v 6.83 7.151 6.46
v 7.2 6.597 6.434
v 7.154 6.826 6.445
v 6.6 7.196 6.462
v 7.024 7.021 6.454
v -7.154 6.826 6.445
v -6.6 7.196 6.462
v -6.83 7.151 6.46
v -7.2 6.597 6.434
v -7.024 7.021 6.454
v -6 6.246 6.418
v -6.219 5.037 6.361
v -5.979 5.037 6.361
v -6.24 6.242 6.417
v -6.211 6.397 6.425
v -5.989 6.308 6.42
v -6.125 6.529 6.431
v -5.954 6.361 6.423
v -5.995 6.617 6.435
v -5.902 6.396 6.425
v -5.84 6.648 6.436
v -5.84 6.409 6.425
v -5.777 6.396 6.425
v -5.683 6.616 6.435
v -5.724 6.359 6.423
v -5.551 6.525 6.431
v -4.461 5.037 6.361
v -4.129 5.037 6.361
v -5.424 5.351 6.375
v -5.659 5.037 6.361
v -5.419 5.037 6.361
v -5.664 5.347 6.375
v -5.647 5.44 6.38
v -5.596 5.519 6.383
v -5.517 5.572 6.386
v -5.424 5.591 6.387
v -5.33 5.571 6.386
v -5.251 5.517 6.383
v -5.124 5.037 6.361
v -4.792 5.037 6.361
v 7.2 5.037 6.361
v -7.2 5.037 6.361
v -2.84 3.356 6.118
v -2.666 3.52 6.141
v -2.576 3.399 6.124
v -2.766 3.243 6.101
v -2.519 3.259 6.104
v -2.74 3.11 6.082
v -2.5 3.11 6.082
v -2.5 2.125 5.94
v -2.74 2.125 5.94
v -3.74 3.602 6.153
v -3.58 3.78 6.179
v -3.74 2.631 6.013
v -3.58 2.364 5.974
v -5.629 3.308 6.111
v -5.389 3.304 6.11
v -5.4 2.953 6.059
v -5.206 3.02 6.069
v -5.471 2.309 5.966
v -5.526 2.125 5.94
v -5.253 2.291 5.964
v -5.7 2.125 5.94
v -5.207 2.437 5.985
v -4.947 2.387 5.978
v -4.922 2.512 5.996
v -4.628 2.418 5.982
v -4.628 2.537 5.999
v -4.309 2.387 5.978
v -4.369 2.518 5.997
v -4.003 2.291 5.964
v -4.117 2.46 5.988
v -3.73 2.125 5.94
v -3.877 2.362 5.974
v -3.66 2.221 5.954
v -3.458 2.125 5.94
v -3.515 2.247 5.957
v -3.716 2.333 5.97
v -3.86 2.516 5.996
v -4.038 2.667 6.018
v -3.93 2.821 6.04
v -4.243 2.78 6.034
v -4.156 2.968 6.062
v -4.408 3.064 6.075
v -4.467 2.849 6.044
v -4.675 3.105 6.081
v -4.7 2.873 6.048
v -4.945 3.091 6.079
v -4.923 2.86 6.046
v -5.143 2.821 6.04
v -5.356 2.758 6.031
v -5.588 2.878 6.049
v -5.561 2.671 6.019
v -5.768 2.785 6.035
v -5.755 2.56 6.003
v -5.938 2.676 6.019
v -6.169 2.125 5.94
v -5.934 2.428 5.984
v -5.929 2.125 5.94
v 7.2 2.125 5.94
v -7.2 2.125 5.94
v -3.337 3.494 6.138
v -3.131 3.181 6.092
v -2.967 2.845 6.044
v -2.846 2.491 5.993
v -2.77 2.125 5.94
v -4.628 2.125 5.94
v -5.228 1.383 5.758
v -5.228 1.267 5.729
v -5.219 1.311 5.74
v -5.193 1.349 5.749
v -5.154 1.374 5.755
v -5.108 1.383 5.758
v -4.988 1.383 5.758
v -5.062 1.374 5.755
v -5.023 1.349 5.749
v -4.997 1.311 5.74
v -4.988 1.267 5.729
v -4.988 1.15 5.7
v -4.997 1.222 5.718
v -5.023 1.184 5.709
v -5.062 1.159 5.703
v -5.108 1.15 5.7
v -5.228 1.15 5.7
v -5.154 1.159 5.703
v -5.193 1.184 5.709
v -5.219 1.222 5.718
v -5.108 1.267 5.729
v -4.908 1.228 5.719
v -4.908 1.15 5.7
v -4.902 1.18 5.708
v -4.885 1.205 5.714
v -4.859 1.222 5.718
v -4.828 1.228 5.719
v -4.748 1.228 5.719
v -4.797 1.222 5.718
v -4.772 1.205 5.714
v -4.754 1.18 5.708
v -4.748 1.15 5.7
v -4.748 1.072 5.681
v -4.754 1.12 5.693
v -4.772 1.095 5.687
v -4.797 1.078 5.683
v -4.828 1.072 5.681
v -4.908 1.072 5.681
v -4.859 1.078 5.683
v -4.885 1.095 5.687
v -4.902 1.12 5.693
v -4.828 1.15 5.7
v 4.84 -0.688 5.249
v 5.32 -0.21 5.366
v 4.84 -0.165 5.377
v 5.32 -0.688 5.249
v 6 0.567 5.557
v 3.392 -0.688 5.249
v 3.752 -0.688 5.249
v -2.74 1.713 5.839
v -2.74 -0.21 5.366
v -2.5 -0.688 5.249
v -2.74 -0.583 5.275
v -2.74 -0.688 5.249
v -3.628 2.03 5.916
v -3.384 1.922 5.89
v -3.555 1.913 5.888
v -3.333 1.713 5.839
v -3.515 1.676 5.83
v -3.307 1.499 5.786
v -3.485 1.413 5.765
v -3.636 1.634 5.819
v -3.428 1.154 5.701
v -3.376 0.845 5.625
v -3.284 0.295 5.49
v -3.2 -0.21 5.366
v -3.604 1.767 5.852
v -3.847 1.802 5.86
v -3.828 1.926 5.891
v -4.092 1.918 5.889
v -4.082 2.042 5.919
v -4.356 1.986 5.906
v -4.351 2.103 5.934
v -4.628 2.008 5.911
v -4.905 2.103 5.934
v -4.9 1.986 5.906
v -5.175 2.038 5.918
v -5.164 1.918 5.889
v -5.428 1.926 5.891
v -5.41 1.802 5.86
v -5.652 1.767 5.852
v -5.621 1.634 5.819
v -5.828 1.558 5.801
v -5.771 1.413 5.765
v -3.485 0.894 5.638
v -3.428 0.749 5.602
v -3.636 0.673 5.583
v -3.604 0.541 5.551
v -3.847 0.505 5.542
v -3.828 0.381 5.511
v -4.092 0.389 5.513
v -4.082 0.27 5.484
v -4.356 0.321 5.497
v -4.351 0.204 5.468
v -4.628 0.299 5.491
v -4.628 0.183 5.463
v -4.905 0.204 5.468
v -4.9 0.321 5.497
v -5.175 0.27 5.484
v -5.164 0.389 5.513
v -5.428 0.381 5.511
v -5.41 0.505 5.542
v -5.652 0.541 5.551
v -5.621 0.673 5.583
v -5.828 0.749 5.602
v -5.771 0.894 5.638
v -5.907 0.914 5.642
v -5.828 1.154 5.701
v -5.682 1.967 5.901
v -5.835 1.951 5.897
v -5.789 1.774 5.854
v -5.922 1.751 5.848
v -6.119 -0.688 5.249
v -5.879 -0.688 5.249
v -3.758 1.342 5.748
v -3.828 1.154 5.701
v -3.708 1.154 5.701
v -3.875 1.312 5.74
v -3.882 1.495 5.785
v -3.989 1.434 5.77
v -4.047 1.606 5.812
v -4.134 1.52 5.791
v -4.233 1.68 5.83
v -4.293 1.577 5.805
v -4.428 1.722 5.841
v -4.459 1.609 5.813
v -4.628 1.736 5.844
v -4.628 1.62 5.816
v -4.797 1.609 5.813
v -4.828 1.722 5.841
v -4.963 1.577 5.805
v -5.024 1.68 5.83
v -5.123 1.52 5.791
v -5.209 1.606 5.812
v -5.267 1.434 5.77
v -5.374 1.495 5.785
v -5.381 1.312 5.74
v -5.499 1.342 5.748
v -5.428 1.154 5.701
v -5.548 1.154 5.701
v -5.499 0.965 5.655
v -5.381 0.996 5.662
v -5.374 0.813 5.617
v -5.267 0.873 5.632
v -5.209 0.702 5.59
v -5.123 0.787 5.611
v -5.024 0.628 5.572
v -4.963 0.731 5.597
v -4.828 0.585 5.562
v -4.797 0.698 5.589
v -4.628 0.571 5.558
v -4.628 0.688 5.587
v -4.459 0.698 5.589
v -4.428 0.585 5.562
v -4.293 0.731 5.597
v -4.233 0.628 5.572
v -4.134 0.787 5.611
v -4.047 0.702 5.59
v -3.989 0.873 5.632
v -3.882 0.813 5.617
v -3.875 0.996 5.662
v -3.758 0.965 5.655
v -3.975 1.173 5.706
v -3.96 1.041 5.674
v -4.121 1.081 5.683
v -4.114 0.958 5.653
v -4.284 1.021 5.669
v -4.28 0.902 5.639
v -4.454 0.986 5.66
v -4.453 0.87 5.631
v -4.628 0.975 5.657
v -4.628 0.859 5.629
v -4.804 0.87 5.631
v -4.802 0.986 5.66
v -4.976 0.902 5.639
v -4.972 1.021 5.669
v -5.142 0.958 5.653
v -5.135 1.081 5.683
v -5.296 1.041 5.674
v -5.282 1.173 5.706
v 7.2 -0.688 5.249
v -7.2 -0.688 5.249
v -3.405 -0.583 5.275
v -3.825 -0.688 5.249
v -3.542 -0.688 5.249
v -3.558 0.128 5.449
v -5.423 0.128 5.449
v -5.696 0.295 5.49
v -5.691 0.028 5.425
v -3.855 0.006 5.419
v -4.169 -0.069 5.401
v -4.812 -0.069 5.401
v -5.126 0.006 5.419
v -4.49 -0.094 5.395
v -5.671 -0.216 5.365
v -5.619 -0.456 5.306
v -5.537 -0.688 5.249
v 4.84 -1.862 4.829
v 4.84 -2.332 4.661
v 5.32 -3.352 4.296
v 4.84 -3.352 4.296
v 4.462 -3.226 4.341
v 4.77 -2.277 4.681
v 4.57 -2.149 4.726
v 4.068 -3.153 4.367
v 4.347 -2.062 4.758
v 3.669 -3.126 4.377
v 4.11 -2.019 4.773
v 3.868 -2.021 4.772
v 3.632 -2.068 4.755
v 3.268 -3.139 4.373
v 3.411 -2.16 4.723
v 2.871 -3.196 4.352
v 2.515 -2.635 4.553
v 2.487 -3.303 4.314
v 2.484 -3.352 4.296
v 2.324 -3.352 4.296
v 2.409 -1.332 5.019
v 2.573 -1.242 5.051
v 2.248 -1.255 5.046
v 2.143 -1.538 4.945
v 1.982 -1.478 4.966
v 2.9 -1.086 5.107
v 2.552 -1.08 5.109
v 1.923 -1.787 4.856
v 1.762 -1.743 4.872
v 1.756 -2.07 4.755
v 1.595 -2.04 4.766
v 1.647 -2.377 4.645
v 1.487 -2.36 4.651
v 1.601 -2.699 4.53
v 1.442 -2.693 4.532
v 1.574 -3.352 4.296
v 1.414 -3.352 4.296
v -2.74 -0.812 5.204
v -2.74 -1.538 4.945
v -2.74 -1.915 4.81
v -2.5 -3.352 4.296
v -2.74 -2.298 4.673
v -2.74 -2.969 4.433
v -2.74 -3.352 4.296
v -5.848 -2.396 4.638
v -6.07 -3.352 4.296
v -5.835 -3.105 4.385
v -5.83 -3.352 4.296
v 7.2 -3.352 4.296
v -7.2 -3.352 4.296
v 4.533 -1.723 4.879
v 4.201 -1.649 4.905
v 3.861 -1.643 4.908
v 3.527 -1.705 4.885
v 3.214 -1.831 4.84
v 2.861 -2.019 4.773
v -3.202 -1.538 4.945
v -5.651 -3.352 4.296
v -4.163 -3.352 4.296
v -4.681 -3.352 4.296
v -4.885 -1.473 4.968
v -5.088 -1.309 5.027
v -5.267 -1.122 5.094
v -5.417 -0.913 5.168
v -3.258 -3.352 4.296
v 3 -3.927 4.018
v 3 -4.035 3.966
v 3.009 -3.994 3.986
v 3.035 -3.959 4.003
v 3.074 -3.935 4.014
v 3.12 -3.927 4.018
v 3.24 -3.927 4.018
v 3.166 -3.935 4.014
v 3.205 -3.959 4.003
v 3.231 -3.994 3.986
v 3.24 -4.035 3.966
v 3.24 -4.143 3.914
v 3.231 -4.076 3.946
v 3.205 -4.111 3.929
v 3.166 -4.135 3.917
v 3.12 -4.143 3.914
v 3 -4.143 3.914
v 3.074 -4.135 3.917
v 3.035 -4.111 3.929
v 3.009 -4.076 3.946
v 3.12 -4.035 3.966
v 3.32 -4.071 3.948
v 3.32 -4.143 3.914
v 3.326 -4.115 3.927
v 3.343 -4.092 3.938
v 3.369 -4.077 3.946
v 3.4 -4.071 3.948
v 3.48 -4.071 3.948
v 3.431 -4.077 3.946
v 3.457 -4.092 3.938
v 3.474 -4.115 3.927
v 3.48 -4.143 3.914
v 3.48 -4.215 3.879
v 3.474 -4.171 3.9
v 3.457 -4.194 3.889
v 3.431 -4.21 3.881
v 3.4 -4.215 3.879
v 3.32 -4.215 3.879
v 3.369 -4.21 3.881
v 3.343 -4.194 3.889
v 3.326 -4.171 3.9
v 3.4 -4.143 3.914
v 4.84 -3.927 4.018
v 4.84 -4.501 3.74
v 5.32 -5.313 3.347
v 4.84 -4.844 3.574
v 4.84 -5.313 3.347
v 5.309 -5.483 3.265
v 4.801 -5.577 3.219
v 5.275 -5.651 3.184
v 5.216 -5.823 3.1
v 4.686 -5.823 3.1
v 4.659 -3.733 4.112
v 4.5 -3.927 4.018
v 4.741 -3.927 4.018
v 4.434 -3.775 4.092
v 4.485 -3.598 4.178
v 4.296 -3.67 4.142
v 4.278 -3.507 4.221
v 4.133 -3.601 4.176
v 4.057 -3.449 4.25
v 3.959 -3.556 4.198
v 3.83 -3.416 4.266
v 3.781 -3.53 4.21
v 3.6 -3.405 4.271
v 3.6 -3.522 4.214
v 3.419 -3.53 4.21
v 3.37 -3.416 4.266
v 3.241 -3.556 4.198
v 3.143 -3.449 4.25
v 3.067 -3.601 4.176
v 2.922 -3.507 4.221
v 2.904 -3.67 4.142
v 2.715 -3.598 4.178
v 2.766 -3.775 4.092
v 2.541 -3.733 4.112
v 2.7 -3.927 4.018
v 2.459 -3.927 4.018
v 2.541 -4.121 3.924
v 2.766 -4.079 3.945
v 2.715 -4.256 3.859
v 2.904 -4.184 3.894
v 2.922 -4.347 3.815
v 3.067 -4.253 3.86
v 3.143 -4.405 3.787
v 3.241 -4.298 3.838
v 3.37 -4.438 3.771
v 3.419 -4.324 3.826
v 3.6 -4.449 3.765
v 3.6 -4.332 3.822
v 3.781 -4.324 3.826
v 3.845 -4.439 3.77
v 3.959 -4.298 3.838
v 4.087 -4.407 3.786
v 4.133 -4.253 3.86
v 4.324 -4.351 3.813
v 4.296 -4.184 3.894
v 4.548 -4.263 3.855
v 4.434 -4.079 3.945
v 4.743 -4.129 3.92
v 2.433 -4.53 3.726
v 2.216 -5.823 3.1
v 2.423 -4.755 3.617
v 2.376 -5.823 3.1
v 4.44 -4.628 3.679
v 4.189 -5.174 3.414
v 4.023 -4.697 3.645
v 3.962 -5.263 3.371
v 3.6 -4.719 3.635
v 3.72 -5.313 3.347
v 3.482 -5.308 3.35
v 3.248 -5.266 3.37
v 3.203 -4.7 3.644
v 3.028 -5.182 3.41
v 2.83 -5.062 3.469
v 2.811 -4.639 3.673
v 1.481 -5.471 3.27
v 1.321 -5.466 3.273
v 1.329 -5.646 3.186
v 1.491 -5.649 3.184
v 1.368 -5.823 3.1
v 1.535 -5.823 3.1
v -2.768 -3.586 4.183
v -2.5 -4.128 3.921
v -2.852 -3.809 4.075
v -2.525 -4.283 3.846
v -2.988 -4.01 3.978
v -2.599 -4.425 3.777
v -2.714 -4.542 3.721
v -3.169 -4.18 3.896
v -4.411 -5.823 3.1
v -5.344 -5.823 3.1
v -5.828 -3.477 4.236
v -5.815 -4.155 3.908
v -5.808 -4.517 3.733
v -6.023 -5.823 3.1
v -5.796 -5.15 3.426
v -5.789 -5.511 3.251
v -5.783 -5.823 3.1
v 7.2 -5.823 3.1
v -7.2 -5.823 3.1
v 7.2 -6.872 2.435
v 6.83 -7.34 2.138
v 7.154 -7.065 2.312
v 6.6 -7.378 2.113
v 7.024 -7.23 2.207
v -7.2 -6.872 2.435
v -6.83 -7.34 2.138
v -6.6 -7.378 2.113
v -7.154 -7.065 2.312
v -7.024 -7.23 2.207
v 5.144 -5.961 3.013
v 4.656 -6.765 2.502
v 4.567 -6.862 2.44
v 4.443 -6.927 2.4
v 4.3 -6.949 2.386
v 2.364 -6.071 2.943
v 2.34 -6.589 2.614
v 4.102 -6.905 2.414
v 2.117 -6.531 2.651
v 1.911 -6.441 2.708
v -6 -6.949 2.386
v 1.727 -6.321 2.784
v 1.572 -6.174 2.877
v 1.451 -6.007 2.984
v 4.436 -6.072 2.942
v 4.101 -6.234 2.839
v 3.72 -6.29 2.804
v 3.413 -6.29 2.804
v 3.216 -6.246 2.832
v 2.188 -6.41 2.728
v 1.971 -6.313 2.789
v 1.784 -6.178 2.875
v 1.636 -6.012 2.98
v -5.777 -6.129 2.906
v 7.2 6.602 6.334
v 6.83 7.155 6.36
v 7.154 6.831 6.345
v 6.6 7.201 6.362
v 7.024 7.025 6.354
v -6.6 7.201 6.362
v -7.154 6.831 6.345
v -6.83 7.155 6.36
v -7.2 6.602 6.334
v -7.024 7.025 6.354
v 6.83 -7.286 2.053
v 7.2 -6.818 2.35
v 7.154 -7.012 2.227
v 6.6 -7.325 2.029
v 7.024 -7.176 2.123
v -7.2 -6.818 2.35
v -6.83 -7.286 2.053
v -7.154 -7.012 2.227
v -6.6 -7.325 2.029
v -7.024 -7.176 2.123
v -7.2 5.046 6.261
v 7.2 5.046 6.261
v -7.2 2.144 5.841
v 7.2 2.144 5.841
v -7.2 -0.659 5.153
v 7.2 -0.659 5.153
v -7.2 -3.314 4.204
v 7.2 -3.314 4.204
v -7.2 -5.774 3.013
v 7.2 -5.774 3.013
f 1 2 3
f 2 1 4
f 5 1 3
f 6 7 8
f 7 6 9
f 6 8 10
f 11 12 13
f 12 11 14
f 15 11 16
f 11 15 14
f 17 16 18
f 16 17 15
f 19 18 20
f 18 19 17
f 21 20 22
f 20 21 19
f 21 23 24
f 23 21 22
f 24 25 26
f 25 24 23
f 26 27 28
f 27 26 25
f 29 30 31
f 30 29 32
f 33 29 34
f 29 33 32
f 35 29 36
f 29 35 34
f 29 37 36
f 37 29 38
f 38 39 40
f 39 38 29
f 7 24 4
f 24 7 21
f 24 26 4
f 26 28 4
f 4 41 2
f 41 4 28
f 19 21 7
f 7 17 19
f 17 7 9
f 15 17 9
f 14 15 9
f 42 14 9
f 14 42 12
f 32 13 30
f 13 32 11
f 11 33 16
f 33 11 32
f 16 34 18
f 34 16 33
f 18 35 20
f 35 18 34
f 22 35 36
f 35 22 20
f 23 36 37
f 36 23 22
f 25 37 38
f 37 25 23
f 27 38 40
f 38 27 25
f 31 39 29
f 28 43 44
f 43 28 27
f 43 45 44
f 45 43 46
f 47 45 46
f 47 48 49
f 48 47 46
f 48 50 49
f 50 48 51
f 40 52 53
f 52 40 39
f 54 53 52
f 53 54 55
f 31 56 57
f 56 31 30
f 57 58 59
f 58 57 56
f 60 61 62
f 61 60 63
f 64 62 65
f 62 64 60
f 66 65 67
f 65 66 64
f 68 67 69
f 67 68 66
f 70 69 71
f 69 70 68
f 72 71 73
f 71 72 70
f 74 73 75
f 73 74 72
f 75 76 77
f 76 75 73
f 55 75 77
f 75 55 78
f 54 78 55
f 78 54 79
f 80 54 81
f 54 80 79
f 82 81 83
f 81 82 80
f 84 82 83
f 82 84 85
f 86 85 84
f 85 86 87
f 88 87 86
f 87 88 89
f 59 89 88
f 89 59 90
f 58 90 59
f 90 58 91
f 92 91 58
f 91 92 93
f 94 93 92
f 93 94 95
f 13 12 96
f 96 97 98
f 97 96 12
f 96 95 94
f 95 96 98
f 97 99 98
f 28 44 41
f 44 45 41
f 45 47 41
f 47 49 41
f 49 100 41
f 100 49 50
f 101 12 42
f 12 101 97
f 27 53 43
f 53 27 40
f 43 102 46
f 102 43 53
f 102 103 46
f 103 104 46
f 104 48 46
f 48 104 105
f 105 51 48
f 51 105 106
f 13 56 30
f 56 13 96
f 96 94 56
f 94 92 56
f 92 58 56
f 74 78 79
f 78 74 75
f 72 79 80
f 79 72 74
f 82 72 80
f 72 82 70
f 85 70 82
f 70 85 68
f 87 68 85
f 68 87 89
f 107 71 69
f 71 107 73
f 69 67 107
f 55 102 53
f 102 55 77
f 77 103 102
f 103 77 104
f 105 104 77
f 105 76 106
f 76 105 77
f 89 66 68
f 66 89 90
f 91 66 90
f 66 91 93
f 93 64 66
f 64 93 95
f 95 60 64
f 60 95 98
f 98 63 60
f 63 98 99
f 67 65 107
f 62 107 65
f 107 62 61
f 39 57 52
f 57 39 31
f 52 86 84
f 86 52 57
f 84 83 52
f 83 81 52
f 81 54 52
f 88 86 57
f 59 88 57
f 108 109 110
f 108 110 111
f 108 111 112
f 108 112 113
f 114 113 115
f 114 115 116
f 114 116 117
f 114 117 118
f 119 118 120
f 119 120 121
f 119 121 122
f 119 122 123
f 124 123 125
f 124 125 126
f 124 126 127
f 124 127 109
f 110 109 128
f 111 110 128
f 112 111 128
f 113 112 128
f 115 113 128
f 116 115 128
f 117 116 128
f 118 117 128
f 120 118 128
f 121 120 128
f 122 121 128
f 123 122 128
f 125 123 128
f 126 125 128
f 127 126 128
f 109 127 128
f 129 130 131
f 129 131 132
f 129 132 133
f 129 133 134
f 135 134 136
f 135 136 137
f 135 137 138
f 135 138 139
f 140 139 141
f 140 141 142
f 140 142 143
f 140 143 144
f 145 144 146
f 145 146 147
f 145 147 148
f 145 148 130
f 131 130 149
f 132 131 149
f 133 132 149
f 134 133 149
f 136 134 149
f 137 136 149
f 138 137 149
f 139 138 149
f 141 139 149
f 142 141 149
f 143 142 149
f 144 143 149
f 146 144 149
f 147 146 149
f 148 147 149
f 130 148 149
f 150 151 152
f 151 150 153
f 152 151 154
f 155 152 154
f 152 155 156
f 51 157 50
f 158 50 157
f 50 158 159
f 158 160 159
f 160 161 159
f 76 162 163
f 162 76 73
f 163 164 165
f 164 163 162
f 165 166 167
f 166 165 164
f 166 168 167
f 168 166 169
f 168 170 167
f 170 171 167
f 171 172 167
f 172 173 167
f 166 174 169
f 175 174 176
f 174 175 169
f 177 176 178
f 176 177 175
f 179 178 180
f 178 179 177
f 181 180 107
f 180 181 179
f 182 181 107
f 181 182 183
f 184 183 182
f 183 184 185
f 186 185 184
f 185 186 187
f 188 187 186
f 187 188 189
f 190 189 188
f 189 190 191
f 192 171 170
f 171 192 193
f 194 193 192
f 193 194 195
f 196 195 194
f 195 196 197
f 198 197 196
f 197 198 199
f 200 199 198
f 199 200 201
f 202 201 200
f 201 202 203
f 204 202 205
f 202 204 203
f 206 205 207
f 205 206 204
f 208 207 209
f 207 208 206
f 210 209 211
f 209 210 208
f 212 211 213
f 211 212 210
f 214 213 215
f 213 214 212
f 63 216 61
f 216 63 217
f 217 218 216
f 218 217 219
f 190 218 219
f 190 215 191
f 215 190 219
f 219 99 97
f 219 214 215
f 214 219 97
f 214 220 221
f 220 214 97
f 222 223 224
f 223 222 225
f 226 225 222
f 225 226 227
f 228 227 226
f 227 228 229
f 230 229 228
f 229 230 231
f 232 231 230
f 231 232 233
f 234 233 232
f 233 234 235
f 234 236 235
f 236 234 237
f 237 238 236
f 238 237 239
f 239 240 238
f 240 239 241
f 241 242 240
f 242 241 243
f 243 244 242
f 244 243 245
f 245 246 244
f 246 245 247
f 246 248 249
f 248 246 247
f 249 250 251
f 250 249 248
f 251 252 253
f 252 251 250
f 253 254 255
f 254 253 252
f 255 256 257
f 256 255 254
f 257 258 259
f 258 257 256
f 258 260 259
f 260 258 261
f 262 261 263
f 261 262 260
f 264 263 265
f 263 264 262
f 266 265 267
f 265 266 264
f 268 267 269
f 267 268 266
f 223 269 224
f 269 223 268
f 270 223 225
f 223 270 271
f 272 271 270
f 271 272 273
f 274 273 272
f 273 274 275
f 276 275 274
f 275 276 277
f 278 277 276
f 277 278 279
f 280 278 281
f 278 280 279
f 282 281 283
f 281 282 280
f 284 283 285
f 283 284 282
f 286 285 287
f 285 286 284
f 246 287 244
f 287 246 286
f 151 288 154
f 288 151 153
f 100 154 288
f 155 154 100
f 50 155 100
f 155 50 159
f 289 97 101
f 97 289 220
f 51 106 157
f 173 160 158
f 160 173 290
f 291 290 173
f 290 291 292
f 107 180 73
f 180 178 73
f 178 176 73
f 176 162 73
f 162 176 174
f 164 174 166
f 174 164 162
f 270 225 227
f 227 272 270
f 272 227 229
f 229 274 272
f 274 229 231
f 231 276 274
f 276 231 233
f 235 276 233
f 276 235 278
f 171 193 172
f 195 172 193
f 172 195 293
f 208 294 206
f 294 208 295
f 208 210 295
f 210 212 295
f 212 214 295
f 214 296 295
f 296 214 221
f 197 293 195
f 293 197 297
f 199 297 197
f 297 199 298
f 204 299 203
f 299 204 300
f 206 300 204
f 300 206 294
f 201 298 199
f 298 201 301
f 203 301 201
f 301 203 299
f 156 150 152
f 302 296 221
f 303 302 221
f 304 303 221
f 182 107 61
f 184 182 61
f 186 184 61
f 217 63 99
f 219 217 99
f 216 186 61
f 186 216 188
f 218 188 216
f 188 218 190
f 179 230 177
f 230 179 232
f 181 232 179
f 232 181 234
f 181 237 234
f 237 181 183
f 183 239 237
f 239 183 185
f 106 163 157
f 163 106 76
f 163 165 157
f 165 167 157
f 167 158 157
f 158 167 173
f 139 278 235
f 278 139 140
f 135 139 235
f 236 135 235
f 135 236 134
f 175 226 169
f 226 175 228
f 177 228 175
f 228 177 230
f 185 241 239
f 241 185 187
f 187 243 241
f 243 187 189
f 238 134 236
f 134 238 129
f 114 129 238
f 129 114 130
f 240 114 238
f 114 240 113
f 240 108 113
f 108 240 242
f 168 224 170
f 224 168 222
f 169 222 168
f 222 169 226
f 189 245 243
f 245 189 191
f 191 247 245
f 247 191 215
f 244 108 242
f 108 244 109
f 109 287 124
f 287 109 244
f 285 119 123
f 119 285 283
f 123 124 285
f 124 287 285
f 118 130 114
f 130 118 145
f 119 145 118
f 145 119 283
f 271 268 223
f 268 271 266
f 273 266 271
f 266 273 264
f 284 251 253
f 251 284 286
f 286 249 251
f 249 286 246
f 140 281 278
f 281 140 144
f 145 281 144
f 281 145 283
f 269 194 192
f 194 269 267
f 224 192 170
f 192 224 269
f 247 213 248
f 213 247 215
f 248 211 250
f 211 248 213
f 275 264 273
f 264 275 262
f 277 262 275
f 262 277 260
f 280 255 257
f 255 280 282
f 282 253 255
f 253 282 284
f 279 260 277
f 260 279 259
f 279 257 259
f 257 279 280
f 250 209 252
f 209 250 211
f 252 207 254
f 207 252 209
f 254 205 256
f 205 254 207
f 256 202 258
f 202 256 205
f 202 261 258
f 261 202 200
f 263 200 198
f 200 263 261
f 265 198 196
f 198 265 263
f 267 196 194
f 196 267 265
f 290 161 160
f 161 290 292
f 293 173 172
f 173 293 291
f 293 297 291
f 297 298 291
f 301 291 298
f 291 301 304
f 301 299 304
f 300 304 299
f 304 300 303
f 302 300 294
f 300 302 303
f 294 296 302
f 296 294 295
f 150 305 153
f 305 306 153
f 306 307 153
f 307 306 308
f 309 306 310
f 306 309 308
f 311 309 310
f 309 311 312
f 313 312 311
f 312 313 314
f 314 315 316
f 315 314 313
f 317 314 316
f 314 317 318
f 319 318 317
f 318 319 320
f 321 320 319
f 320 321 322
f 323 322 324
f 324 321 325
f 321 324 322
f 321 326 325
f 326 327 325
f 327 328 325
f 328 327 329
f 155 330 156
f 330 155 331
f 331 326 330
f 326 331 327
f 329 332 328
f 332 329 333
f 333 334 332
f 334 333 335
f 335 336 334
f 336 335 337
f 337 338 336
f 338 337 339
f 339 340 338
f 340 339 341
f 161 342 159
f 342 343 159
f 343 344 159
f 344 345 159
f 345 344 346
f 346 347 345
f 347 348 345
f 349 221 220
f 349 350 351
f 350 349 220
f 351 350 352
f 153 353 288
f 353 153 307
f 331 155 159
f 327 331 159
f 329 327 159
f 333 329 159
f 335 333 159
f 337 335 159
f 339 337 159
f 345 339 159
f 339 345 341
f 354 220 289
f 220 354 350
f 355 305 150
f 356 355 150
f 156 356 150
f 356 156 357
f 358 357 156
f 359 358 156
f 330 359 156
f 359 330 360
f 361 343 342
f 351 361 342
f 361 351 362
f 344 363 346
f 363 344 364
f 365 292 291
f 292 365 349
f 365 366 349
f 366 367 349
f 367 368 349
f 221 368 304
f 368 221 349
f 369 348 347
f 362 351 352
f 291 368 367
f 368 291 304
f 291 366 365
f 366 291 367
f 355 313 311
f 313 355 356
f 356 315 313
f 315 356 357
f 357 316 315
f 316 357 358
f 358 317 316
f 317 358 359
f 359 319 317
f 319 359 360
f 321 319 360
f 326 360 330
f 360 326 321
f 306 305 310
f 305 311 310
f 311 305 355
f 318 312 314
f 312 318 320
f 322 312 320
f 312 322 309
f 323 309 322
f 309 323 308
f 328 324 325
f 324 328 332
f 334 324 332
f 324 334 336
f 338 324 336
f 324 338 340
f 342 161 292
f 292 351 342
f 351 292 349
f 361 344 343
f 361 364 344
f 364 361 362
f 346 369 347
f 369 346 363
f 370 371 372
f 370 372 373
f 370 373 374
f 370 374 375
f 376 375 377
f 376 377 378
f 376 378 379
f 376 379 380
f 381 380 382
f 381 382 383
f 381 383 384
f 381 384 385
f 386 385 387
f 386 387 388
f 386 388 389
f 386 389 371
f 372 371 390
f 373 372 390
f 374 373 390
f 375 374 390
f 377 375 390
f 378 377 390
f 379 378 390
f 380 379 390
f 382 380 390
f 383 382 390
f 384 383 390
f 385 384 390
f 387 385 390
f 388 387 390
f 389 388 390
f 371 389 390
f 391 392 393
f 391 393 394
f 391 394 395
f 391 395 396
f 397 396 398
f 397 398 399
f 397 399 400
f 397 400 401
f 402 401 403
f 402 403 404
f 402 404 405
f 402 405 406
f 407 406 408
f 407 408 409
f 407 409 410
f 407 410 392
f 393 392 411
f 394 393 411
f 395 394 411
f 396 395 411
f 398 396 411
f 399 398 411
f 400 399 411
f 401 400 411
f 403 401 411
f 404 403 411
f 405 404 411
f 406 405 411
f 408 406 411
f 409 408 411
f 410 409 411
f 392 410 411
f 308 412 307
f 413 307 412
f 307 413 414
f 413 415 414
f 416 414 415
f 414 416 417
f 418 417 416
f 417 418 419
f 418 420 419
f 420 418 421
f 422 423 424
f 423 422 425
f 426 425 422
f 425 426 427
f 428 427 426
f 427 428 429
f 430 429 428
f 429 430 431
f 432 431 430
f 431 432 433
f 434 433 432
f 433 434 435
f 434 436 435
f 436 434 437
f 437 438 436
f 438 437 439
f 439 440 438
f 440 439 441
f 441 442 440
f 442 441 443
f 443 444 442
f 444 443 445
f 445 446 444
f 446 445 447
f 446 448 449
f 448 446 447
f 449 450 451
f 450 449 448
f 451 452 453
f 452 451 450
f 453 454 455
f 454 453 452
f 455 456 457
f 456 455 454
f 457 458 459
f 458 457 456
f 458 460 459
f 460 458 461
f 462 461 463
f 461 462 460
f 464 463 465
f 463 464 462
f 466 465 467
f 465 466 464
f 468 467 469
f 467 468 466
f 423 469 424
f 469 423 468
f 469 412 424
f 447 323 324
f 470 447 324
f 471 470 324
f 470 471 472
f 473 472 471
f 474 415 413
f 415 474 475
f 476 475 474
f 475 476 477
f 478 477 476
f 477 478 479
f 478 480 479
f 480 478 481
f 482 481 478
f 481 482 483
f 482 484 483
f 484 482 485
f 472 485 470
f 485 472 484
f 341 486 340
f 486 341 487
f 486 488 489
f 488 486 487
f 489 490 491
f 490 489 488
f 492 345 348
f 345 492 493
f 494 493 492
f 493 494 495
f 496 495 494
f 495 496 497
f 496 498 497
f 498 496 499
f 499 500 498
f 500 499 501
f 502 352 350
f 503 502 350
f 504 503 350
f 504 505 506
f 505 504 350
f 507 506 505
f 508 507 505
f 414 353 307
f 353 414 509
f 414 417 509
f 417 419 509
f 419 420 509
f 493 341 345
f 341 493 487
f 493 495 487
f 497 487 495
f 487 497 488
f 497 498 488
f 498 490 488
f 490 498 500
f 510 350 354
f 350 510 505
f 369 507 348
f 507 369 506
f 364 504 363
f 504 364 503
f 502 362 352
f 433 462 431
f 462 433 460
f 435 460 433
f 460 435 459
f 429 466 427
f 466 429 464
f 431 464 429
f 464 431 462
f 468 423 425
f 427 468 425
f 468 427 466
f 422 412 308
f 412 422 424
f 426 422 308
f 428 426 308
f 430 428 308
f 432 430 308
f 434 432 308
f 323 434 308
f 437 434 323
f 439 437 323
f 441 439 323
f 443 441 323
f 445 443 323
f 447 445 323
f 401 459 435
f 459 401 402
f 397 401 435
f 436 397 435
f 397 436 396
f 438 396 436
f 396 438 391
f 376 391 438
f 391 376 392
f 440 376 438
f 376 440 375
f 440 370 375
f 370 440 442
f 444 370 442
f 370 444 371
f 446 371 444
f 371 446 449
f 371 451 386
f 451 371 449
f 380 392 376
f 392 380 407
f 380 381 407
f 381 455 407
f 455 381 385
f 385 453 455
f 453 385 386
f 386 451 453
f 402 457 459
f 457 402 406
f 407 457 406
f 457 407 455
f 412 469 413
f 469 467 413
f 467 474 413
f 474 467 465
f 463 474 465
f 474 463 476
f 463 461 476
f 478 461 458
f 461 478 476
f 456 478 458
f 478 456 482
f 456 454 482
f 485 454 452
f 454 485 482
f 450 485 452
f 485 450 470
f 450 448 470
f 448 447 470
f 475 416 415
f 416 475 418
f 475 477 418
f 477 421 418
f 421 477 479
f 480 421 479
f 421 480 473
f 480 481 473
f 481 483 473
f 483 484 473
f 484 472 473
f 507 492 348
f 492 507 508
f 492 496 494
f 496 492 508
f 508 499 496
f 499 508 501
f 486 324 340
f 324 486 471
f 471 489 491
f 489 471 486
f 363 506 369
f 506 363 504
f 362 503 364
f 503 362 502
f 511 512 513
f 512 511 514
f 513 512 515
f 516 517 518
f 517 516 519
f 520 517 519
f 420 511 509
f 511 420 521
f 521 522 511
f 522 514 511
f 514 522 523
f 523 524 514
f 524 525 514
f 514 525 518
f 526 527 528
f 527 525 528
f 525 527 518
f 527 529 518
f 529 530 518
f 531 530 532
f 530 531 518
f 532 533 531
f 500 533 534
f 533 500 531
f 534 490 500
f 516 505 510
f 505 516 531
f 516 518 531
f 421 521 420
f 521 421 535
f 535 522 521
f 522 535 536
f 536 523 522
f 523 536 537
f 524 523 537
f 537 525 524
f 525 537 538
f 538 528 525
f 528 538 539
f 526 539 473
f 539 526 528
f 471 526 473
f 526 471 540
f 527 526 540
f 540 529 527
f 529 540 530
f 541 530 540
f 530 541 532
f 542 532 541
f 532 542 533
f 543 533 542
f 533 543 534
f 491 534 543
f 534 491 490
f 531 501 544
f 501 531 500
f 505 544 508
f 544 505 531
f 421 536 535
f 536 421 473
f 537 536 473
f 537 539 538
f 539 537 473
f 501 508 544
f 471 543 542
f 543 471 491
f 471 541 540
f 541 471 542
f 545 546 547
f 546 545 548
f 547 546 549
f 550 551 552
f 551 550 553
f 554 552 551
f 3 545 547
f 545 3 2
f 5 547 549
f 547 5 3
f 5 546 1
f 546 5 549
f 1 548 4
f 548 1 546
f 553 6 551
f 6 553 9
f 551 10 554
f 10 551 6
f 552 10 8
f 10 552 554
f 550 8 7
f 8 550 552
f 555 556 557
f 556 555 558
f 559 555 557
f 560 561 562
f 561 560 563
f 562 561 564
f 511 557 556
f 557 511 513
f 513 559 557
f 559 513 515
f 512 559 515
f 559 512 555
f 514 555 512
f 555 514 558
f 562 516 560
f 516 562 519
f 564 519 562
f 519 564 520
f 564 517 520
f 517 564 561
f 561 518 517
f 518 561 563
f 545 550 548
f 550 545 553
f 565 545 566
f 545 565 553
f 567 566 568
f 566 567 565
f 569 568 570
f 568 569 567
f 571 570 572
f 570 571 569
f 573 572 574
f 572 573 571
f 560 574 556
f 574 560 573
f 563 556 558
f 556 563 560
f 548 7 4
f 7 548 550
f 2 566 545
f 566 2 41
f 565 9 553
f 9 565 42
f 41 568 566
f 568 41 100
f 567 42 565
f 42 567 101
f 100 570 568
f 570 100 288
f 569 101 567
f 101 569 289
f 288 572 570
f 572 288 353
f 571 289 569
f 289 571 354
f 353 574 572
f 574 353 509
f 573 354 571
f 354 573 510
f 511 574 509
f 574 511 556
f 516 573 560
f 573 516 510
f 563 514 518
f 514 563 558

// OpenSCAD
use <../lib.scad>
use <6141955gc01.scad>
function ldraw_lib__6141955ic01() = [
// 0 Sticker  1.9 x  1.8 with Headlights on Blue Background Left (Formed)
// 0 Name: 6141955ic01.dat
// 0 Author: Massimo Maso [Sirio]
// 0 !LDRAW_ORG Part UPDATE 2025-03
// 0 !LICENSE Licensed under CC BY 4.0 : see CAreadme.txt
// 
// 0 BFC CERTIFY CCW
  [0,"BFC","CERTIFY"],
  [0,"BFC","CCW"],
// 
// 0 !KEYWORDS Bricklink 75871stk01a, Brickowl 197362, Ford, GT, Mustang
// 0 !KEYWORDS Rebrickable 24746, Set 75871, Speed Champions
// 
// 0 !HISTORY 2025-03-30 [OrionP] Official Update 2025-03
// 
// 1 16 0 0 0 -1 0 0 0 1 0 0 0 1 6141955gc01.dat
  [1,16,0,0,0,-1,0,0,0,1,0,0,0,1, ldraw_lib__6141955gc01()],
];
module ldraw_lib__6141955ic01(step=0, col=false, unit=2/5, alt=false, line=0.2, solid=!$preview)
    makepoly(ldraw_lib__6141955ic01(), step=step, col=col, unit=unit, alt=alt, line=line, solid=solid);
ldraw_lib__6141955ic01(line=0.2);
